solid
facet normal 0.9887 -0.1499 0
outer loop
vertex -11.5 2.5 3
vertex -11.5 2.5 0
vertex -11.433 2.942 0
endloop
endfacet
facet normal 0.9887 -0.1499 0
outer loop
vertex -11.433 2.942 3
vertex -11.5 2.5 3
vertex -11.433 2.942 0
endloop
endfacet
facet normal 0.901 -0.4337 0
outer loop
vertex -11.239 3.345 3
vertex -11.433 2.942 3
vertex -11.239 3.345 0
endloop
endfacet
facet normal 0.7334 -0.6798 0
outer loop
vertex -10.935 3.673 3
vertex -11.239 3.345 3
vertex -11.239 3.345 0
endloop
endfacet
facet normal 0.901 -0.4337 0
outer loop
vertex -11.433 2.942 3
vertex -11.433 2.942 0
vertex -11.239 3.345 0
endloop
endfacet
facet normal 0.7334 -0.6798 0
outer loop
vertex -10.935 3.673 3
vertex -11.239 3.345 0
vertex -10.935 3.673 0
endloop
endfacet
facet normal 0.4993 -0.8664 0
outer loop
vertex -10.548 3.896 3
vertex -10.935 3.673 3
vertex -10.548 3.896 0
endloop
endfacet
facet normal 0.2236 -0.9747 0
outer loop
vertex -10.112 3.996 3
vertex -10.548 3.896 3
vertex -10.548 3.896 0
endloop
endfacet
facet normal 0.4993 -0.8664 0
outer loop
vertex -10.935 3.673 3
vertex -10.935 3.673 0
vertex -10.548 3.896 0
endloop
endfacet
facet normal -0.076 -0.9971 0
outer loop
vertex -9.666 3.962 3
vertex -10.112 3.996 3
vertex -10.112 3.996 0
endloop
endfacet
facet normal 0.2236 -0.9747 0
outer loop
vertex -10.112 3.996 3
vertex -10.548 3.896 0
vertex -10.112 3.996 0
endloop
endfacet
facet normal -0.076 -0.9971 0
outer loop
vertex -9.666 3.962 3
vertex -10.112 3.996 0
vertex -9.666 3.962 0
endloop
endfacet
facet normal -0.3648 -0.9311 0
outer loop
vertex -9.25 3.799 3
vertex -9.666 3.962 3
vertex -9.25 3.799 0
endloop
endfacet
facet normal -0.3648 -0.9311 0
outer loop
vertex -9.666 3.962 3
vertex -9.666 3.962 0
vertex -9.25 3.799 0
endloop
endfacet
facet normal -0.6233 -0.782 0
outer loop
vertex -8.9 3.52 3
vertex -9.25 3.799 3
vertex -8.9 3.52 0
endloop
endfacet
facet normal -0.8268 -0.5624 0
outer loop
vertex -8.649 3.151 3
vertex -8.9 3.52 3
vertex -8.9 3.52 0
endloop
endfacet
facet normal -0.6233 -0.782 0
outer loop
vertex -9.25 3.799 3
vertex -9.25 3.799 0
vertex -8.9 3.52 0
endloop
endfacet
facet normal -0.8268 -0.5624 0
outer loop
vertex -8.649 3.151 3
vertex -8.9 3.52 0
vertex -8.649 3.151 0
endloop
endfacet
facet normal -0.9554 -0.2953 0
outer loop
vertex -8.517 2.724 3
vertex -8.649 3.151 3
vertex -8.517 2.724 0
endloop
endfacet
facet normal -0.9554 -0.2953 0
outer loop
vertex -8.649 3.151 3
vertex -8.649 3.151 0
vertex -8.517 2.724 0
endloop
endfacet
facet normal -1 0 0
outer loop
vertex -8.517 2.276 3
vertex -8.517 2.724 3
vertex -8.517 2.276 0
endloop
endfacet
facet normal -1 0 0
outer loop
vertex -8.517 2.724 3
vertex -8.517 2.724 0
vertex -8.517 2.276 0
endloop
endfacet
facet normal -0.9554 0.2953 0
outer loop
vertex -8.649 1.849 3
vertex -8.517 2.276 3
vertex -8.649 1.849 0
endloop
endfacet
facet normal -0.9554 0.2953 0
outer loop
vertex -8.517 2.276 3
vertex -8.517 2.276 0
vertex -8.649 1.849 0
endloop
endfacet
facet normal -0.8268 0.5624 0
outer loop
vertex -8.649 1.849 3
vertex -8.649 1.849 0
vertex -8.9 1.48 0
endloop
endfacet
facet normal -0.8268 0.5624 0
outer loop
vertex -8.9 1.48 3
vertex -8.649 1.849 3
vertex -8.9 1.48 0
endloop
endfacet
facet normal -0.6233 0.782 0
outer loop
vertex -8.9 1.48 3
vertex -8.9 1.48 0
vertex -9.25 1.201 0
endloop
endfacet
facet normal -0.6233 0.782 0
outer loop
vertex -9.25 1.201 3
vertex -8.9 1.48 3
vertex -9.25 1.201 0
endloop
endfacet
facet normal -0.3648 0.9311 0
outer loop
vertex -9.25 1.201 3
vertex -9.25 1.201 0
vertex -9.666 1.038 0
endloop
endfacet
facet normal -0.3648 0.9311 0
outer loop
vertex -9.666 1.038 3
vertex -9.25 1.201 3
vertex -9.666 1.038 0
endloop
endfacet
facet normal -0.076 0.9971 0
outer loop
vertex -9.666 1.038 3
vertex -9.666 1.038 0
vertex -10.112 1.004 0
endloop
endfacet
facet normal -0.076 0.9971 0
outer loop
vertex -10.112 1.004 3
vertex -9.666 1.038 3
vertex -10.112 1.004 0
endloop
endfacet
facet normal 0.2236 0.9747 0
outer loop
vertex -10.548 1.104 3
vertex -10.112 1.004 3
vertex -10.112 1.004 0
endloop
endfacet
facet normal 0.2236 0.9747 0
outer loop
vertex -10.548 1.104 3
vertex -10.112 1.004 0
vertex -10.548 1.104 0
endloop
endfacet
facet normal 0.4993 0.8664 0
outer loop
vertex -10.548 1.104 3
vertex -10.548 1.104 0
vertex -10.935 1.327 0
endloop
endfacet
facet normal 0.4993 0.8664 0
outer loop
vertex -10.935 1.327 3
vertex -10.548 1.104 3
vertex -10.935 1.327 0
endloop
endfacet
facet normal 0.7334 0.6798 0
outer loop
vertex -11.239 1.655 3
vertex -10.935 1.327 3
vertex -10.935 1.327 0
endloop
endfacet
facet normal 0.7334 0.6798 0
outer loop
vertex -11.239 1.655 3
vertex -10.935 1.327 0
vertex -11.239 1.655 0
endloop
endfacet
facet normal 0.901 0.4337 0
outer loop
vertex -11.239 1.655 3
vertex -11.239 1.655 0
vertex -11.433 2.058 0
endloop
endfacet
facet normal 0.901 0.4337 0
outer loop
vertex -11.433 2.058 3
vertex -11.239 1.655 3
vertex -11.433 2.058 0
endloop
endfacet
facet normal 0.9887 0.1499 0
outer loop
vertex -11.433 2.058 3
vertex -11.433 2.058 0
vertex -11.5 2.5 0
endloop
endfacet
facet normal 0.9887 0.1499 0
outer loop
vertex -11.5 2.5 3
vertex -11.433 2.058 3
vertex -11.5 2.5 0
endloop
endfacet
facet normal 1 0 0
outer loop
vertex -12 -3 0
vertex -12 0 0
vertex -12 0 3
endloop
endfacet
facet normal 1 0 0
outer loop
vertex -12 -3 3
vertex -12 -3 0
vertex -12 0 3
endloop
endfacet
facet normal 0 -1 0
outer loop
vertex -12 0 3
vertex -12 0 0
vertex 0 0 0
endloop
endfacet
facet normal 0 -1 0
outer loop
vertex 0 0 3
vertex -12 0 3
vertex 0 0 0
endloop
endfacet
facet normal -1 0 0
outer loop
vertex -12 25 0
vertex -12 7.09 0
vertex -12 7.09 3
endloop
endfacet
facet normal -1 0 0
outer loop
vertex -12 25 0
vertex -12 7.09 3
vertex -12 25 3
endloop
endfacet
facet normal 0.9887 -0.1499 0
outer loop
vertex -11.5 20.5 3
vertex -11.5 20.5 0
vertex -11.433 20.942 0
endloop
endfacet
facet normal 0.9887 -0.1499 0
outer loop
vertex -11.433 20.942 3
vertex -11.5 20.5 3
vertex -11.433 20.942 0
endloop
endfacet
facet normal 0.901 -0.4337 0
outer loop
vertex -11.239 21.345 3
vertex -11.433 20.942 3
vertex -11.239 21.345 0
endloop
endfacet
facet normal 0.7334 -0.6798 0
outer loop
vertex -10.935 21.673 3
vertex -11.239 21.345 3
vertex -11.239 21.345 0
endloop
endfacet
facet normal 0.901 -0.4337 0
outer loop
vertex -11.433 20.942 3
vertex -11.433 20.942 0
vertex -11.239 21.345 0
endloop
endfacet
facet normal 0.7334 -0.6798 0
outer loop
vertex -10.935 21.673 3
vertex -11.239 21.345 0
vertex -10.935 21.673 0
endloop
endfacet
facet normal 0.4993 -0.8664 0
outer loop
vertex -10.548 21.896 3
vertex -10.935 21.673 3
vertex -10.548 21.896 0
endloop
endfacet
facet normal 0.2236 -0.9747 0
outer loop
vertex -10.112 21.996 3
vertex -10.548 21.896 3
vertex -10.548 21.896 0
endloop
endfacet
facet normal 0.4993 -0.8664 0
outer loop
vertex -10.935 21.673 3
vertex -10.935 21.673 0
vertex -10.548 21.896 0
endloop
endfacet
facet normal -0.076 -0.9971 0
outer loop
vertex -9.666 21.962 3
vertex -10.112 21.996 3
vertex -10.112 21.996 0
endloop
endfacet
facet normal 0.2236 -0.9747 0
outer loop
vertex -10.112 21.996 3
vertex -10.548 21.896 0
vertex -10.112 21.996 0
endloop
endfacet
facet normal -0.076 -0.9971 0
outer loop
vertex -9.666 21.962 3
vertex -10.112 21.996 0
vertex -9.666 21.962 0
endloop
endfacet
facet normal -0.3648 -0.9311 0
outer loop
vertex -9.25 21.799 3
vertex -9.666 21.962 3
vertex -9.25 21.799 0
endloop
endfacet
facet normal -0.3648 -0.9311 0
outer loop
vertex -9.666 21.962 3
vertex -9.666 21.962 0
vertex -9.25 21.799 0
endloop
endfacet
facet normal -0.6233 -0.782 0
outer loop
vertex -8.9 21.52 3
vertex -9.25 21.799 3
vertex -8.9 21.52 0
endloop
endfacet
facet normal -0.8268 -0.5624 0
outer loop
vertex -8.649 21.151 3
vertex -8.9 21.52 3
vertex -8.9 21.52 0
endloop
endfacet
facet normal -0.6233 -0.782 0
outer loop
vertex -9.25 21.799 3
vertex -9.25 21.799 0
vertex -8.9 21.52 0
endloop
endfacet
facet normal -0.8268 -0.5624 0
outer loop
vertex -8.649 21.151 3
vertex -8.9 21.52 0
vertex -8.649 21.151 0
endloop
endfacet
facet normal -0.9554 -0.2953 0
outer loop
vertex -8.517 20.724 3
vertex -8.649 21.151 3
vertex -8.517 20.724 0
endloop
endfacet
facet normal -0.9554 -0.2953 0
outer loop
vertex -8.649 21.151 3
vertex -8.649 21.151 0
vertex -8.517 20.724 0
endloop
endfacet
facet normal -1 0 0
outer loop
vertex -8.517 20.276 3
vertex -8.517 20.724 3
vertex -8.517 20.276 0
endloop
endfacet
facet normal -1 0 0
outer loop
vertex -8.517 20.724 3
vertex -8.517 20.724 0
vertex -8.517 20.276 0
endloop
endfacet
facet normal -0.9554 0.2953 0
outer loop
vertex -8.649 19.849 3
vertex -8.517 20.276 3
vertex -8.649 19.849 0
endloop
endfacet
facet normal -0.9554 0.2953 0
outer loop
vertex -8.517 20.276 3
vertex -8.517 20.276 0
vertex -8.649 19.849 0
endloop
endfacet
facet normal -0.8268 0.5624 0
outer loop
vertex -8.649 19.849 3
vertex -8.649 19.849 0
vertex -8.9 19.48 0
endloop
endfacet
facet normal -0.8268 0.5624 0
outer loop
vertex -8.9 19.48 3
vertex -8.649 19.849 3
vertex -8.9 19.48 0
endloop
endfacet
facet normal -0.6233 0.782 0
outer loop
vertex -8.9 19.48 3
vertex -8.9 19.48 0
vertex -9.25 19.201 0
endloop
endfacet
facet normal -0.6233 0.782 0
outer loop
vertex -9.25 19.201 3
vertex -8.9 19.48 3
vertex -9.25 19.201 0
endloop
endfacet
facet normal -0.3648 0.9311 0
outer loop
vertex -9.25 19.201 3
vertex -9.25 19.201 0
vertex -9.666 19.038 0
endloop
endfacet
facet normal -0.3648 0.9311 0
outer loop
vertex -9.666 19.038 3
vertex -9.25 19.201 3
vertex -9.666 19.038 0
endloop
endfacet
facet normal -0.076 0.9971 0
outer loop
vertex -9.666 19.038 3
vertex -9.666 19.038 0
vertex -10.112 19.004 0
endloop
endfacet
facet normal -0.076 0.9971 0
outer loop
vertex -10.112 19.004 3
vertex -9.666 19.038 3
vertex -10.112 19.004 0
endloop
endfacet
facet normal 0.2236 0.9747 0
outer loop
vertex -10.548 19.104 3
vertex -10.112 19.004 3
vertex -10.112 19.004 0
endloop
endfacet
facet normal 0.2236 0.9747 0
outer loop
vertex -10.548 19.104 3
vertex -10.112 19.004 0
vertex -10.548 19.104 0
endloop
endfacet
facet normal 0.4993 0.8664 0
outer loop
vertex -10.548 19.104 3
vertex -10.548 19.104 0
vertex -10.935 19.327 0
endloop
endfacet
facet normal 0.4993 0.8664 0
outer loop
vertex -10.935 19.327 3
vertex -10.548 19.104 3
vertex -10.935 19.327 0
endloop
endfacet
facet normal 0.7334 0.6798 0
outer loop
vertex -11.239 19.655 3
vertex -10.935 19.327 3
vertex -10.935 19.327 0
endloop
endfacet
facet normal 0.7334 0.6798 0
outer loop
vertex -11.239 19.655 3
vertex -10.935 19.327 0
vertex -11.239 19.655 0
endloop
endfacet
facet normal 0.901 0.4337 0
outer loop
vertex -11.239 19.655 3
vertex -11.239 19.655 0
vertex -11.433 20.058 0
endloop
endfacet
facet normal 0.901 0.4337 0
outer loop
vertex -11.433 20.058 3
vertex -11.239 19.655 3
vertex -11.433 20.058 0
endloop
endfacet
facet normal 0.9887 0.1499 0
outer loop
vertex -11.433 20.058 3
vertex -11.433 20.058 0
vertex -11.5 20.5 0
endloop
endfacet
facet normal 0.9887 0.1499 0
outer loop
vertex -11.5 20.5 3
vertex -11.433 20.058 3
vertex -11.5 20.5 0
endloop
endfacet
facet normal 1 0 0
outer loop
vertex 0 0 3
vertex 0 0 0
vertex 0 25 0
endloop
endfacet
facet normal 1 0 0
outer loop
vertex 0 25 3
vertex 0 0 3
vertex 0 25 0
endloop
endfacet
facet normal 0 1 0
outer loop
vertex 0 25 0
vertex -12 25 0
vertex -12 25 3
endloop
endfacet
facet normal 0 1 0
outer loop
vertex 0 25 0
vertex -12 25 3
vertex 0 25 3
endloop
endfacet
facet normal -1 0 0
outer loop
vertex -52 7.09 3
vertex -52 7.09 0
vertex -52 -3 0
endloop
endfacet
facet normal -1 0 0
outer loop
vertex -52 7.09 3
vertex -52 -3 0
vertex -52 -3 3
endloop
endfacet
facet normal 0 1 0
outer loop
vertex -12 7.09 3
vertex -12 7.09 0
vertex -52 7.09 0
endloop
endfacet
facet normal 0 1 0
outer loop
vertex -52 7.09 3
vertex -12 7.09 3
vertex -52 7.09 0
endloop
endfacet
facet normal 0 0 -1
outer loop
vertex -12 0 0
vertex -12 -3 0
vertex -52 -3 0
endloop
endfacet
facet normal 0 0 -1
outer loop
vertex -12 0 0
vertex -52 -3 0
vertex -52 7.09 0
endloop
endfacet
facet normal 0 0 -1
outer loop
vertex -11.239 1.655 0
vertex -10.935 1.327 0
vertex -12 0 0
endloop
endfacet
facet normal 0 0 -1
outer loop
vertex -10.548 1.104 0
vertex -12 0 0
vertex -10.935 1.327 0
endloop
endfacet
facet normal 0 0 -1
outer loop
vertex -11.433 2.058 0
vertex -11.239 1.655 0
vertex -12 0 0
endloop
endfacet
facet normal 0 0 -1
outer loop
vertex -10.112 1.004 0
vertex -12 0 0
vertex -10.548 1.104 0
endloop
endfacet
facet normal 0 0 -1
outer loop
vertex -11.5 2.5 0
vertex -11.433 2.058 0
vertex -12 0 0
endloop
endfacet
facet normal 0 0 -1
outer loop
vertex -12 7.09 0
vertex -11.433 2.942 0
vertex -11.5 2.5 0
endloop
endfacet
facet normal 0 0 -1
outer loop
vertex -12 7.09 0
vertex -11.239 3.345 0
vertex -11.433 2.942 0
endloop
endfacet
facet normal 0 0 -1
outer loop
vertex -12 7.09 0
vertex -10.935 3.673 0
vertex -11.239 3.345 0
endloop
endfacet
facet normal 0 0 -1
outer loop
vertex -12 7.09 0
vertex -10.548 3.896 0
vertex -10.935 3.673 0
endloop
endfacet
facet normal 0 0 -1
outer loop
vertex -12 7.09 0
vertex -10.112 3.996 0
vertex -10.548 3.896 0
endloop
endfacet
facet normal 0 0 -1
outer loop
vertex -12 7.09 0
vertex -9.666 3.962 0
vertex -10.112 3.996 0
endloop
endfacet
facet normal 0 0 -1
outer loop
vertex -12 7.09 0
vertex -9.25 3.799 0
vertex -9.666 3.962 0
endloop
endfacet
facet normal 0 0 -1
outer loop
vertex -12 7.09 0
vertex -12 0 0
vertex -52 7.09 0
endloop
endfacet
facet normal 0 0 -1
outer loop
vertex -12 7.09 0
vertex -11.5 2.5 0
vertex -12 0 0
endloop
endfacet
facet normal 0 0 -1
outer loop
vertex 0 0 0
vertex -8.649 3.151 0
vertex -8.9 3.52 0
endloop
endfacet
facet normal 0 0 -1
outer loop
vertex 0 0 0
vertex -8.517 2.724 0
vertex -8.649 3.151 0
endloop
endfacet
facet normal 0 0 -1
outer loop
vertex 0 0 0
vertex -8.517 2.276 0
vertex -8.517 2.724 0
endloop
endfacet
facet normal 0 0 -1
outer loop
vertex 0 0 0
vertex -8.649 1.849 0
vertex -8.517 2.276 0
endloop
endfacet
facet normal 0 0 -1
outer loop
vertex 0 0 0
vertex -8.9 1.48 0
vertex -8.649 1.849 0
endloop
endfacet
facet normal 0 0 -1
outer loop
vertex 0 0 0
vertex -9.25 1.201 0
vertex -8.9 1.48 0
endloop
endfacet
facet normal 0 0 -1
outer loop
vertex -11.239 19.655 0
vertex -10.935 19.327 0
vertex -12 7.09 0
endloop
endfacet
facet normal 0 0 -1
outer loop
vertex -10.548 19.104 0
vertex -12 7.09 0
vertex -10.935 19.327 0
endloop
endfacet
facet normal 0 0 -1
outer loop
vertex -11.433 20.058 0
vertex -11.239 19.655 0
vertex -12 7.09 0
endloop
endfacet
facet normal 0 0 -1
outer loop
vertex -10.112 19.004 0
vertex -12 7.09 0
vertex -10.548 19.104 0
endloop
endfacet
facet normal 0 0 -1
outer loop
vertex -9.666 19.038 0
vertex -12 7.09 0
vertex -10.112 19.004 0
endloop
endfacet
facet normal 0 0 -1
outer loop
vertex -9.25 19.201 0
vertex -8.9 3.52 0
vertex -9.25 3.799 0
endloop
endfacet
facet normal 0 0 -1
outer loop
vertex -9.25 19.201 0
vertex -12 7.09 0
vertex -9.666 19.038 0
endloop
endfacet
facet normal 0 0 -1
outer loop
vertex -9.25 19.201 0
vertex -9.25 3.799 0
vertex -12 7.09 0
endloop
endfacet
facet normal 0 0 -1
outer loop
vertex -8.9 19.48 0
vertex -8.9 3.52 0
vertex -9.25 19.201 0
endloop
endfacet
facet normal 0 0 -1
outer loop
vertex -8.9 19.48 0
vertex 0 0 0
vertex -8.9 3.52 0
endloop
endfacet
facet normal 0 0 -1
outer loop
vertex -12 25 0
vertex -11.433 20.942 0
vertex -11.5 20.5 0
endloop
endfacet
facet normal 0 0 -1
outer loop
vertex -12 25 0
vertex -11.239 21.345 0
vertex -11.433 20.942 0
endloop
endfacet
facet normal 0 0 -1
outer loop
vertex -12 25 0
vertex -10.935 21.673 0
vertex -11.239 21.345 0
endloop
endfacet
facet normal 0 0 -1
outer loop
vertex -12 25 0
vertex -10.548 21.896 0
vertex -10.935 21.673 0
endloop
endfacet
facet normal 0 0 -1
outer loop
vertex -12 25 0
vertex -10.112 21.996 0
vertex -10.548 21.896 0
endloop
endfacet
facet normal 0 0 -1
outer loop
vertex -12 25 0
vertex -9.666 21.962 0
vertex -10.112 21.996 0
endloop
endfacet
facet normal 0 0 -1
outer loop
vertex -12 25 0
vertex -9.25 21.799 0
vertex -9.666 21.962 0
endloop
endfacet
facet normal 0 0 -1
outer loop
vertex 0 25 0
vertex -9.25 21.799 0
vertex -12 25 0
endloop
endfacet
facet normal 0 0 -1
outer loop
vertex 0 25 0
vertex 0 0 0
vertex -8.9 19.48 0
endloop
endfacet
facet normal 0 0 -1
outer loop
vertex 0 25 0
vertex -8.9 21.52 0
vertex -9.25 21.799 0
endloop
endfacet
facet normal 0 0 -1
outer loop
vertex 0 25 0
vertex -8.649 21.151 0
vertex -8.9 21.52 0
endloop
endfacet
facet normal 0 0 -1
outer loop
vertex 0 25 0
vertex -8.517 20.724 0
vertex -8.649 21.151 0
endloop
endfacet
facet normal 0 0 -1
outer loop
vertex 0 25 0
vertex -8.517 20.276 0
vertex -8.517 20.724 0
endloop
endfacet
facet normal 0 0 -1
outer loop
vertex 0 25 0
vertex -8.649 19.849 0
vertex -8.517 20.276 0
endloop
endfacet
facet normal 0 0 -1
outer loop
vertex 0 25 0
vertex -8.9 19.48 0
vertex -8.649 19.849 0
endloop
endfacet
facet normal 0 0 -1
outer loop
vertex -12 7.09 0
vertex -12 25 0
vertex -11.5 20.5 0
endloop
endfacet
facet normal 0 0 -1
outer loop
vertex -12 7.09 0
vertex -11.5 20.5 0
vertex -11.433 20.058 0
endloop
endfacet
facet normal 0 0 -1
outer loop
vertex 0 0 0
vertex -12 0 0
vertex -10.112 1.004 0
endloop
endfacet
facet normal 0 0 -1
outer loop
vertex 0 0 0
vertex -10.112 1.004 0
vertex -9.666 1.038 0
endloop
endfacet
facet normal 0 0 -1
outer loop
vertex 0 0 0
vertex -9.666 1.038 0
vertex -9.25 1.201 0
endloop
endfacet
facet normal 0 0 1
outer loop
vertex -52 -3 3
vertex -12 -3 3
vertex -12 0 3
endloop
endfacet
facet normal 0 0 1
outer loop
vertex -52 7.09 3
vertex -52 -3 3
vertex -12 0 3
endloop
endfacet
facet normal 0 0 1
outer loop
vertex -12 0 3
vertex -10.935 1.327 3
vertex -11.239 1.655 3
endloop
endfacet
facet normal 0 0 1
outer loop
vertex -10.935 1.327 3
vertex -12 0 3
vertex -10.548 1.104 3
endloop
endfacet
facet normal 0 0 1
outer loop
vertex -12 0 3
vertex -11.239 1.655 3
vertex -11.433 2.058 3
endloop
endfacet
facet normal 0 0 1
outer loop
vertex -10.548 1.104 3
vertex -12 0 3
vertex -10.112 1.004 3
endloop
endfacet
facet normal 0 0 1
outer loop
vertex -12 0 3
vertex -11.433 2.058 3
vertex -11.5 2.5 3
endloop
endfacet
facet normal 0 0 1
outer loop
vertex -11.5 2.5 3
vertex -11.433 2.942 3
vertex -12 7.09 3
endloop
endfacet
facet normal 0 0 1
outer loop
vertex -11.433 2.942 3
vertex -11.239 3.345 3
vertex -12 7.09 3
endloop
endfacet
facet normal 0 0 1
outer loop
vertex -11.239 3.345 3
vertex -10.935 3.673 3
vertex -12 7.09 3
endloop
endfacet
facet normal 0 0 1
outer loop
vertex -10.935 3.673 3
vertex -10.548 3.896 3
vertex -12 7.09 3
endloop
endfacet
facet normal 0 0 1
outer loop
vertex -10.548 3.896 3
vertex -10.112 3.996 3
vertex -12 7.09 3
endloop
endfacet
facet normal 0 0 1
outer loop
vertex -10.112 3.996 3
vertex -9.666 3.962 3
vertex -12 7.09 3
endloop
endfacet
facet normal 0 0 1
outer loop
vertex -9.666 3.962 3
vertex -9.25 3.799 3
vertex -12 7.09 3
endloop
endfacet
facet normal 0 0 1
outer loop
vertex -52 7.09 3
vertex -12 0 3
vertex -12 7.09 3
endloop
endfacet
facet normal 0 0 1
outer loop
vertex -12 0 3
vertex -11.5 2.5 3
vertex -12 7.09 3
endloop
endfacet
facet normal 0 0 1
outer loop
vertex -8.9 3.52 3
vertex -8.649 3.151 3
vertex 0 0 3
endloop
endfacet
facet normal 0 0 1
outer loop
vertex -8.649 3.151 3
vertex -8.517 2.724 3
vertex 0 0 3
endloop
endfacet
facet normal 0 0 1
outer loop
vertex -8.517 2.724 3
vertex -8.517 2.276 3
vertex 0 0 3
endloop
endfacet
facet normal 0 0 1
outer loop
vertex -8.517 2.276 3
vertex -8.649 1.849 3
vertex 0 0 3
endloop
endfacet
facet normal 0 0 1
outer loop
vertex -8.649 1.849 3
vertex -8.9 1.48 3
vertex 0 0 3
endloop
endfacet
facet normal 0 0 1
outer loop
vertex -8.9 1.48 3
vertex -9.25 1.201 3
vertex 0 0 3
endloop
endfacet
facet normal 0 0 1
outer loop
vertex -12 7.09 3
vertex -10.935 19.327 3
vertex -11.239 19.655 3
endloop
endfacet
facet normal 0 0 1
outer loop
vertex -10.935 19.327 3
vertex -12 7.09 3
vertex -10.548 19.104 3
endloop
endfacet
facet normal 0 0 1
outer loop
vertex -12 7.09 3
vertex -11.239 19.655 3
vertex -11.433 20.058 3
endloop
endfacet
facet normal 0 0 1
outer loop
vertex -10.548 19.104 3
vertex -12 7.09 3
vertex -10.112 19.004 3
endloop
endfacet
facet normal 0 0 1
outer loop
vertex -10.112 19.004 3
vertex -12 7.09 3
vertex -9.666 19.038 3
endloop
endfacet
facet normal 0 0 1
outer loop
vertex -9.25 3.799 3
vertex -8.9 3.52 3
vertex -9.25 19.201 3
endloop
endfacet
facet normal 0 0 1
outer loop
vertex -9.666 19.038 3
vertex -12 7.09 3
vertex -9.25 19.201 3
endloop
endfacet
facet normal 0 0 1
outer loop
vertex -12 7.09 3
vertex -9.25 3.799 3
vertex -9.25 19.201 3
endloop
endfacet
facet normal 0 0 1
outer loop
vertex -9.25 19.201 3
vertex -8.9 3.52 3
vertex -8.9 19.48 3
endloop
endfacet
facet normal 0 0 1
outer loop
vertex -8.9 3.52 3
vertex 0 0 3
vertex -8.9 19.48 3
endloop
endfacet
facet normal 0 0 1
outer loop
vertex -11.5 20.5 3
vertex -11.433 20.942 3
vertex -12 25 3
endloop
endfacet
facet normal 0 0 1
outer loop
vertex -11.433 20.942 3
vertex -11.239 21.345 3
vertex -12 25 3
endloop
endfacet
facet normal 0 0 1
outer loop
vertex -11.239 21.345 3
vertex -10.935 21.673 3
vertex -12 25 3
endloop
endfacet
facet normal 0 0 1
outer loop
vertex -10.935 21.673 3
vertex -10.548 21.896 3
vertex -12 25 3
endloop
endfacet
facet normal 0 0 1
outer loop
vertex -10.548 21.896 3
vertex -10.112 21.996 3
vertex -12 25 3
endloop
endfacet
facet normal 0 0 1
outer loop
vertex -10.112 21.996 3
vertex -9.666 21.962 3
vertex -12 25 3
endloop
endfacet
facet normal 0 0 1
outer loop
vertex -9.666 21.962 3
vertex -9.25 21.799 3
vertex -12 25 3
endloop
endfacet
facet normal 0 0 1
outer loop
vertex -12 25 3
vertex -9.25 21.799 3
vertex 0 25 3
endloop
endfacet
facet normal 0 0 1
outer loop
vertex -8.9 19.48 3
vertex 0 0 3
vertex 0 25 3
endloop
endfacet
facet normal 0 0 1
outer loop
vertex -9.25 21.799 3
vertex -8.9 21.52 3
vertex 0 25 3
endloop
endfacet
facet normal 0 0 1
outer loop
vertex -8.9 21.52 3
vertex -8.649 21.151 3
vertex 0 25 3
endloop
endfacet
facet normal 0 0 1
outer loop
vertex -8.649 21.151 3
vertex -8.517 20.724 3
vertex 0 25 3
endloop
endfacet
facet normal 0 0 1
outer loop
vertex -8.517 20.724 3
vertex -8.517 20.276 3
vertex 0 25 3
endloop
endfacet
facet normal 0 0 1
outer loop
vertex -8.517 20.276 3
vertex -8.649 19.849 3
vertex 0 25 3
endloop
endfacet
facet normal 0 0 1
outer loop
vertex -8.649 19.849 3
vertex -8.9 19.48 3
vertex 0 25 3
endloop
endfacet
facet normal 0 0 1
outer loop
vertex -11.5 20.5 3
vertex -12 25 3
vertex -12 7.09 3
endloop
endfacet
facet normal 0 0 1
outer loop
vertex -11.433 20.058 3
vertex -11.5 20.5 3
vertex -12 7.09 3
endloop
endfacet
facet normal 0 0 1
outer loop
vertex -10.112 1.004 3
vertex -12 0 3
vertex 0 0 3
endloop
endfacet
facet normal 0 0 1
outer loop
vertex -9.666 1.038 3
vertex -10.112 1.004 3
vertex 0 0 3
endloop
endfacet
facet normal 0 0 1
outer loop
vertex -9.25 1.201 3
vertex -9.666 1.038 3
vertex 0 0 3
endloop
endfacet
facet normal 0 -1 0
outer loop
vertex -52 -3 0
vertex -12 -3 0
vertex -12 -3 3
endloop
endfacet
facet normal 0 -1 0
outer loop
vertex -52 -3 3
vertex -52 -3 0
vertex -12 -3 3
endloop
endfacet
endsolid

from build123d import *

# Parameters (mm, degrees)
SKETCH1_W           = 12
SKETCH1_H           = 25
BOSS_EXTRUDE1_DEPTH = 3
SKETCH2_R           = 1.5
CUT_EXTRUDE2_DEPTH  = 40
SKETCH4_W           = 3
SKETCH4_H           = 14.090179648
BOSS_EXTRUDE3_DEPTH = 40
SKETCH5_W           = 40
SKETCH5_H           = 3.999871266
CUT_EXTRUDE3_DEPTH  = 10


with BuildPart() as part:
    # Sketch1 → Boss-Extrude1 (new body)
    with BuildSketch(Plane.XY):
        with Locations((-6, 12.5)):
            Rectangle(SKETCH1_W, SKETCH1_H)
    extrude(amount=BOSS_EXTRUDE1_DEPTH)

    # Sketch2 → Cut-Extrude2 (cut)
    with BuildSketch(Plane(origin=(0, 0, 0), x_dir=(-1, 0, 0), z_dir=(0, 0, -1))):
        with Locations((10, 2.5)):
            Circle(SKETCH2_R)
        with Locations((10, 20.5)):
            Circle(SKETCH2_R)
    extrude(amount=-CUT_EXTRUDE2_DEPTH, mode=Mode.SUBTRACT)

    # Sketch4 → Boss-Extrude3 (add)
    with BuildSketch(Plane.ZY.offset(12)):
        with Locations((1.5, 4.045089824)):
            Rectangle(SKETCH4_W, SKETCH4_H)
    extrude(amount=BOSS_EXTRUDE3_DEPTH)

    # Sketch5 → Cut-Extrude3 (cut)
    with BuildSketch(Plane(origin=(0, 0, 0), x_dir=(-1, 0, 0), z_dir=(0, 0, -1))):
        with Locations((32, 9.090244015)):
            Rectangle(SKETCH5_W, SKETCH5_H)
    extrude(amount=-CUT_EXTRUDE3_DEPTH, mode=Mode.SUBTRACT)


solid = part.part
